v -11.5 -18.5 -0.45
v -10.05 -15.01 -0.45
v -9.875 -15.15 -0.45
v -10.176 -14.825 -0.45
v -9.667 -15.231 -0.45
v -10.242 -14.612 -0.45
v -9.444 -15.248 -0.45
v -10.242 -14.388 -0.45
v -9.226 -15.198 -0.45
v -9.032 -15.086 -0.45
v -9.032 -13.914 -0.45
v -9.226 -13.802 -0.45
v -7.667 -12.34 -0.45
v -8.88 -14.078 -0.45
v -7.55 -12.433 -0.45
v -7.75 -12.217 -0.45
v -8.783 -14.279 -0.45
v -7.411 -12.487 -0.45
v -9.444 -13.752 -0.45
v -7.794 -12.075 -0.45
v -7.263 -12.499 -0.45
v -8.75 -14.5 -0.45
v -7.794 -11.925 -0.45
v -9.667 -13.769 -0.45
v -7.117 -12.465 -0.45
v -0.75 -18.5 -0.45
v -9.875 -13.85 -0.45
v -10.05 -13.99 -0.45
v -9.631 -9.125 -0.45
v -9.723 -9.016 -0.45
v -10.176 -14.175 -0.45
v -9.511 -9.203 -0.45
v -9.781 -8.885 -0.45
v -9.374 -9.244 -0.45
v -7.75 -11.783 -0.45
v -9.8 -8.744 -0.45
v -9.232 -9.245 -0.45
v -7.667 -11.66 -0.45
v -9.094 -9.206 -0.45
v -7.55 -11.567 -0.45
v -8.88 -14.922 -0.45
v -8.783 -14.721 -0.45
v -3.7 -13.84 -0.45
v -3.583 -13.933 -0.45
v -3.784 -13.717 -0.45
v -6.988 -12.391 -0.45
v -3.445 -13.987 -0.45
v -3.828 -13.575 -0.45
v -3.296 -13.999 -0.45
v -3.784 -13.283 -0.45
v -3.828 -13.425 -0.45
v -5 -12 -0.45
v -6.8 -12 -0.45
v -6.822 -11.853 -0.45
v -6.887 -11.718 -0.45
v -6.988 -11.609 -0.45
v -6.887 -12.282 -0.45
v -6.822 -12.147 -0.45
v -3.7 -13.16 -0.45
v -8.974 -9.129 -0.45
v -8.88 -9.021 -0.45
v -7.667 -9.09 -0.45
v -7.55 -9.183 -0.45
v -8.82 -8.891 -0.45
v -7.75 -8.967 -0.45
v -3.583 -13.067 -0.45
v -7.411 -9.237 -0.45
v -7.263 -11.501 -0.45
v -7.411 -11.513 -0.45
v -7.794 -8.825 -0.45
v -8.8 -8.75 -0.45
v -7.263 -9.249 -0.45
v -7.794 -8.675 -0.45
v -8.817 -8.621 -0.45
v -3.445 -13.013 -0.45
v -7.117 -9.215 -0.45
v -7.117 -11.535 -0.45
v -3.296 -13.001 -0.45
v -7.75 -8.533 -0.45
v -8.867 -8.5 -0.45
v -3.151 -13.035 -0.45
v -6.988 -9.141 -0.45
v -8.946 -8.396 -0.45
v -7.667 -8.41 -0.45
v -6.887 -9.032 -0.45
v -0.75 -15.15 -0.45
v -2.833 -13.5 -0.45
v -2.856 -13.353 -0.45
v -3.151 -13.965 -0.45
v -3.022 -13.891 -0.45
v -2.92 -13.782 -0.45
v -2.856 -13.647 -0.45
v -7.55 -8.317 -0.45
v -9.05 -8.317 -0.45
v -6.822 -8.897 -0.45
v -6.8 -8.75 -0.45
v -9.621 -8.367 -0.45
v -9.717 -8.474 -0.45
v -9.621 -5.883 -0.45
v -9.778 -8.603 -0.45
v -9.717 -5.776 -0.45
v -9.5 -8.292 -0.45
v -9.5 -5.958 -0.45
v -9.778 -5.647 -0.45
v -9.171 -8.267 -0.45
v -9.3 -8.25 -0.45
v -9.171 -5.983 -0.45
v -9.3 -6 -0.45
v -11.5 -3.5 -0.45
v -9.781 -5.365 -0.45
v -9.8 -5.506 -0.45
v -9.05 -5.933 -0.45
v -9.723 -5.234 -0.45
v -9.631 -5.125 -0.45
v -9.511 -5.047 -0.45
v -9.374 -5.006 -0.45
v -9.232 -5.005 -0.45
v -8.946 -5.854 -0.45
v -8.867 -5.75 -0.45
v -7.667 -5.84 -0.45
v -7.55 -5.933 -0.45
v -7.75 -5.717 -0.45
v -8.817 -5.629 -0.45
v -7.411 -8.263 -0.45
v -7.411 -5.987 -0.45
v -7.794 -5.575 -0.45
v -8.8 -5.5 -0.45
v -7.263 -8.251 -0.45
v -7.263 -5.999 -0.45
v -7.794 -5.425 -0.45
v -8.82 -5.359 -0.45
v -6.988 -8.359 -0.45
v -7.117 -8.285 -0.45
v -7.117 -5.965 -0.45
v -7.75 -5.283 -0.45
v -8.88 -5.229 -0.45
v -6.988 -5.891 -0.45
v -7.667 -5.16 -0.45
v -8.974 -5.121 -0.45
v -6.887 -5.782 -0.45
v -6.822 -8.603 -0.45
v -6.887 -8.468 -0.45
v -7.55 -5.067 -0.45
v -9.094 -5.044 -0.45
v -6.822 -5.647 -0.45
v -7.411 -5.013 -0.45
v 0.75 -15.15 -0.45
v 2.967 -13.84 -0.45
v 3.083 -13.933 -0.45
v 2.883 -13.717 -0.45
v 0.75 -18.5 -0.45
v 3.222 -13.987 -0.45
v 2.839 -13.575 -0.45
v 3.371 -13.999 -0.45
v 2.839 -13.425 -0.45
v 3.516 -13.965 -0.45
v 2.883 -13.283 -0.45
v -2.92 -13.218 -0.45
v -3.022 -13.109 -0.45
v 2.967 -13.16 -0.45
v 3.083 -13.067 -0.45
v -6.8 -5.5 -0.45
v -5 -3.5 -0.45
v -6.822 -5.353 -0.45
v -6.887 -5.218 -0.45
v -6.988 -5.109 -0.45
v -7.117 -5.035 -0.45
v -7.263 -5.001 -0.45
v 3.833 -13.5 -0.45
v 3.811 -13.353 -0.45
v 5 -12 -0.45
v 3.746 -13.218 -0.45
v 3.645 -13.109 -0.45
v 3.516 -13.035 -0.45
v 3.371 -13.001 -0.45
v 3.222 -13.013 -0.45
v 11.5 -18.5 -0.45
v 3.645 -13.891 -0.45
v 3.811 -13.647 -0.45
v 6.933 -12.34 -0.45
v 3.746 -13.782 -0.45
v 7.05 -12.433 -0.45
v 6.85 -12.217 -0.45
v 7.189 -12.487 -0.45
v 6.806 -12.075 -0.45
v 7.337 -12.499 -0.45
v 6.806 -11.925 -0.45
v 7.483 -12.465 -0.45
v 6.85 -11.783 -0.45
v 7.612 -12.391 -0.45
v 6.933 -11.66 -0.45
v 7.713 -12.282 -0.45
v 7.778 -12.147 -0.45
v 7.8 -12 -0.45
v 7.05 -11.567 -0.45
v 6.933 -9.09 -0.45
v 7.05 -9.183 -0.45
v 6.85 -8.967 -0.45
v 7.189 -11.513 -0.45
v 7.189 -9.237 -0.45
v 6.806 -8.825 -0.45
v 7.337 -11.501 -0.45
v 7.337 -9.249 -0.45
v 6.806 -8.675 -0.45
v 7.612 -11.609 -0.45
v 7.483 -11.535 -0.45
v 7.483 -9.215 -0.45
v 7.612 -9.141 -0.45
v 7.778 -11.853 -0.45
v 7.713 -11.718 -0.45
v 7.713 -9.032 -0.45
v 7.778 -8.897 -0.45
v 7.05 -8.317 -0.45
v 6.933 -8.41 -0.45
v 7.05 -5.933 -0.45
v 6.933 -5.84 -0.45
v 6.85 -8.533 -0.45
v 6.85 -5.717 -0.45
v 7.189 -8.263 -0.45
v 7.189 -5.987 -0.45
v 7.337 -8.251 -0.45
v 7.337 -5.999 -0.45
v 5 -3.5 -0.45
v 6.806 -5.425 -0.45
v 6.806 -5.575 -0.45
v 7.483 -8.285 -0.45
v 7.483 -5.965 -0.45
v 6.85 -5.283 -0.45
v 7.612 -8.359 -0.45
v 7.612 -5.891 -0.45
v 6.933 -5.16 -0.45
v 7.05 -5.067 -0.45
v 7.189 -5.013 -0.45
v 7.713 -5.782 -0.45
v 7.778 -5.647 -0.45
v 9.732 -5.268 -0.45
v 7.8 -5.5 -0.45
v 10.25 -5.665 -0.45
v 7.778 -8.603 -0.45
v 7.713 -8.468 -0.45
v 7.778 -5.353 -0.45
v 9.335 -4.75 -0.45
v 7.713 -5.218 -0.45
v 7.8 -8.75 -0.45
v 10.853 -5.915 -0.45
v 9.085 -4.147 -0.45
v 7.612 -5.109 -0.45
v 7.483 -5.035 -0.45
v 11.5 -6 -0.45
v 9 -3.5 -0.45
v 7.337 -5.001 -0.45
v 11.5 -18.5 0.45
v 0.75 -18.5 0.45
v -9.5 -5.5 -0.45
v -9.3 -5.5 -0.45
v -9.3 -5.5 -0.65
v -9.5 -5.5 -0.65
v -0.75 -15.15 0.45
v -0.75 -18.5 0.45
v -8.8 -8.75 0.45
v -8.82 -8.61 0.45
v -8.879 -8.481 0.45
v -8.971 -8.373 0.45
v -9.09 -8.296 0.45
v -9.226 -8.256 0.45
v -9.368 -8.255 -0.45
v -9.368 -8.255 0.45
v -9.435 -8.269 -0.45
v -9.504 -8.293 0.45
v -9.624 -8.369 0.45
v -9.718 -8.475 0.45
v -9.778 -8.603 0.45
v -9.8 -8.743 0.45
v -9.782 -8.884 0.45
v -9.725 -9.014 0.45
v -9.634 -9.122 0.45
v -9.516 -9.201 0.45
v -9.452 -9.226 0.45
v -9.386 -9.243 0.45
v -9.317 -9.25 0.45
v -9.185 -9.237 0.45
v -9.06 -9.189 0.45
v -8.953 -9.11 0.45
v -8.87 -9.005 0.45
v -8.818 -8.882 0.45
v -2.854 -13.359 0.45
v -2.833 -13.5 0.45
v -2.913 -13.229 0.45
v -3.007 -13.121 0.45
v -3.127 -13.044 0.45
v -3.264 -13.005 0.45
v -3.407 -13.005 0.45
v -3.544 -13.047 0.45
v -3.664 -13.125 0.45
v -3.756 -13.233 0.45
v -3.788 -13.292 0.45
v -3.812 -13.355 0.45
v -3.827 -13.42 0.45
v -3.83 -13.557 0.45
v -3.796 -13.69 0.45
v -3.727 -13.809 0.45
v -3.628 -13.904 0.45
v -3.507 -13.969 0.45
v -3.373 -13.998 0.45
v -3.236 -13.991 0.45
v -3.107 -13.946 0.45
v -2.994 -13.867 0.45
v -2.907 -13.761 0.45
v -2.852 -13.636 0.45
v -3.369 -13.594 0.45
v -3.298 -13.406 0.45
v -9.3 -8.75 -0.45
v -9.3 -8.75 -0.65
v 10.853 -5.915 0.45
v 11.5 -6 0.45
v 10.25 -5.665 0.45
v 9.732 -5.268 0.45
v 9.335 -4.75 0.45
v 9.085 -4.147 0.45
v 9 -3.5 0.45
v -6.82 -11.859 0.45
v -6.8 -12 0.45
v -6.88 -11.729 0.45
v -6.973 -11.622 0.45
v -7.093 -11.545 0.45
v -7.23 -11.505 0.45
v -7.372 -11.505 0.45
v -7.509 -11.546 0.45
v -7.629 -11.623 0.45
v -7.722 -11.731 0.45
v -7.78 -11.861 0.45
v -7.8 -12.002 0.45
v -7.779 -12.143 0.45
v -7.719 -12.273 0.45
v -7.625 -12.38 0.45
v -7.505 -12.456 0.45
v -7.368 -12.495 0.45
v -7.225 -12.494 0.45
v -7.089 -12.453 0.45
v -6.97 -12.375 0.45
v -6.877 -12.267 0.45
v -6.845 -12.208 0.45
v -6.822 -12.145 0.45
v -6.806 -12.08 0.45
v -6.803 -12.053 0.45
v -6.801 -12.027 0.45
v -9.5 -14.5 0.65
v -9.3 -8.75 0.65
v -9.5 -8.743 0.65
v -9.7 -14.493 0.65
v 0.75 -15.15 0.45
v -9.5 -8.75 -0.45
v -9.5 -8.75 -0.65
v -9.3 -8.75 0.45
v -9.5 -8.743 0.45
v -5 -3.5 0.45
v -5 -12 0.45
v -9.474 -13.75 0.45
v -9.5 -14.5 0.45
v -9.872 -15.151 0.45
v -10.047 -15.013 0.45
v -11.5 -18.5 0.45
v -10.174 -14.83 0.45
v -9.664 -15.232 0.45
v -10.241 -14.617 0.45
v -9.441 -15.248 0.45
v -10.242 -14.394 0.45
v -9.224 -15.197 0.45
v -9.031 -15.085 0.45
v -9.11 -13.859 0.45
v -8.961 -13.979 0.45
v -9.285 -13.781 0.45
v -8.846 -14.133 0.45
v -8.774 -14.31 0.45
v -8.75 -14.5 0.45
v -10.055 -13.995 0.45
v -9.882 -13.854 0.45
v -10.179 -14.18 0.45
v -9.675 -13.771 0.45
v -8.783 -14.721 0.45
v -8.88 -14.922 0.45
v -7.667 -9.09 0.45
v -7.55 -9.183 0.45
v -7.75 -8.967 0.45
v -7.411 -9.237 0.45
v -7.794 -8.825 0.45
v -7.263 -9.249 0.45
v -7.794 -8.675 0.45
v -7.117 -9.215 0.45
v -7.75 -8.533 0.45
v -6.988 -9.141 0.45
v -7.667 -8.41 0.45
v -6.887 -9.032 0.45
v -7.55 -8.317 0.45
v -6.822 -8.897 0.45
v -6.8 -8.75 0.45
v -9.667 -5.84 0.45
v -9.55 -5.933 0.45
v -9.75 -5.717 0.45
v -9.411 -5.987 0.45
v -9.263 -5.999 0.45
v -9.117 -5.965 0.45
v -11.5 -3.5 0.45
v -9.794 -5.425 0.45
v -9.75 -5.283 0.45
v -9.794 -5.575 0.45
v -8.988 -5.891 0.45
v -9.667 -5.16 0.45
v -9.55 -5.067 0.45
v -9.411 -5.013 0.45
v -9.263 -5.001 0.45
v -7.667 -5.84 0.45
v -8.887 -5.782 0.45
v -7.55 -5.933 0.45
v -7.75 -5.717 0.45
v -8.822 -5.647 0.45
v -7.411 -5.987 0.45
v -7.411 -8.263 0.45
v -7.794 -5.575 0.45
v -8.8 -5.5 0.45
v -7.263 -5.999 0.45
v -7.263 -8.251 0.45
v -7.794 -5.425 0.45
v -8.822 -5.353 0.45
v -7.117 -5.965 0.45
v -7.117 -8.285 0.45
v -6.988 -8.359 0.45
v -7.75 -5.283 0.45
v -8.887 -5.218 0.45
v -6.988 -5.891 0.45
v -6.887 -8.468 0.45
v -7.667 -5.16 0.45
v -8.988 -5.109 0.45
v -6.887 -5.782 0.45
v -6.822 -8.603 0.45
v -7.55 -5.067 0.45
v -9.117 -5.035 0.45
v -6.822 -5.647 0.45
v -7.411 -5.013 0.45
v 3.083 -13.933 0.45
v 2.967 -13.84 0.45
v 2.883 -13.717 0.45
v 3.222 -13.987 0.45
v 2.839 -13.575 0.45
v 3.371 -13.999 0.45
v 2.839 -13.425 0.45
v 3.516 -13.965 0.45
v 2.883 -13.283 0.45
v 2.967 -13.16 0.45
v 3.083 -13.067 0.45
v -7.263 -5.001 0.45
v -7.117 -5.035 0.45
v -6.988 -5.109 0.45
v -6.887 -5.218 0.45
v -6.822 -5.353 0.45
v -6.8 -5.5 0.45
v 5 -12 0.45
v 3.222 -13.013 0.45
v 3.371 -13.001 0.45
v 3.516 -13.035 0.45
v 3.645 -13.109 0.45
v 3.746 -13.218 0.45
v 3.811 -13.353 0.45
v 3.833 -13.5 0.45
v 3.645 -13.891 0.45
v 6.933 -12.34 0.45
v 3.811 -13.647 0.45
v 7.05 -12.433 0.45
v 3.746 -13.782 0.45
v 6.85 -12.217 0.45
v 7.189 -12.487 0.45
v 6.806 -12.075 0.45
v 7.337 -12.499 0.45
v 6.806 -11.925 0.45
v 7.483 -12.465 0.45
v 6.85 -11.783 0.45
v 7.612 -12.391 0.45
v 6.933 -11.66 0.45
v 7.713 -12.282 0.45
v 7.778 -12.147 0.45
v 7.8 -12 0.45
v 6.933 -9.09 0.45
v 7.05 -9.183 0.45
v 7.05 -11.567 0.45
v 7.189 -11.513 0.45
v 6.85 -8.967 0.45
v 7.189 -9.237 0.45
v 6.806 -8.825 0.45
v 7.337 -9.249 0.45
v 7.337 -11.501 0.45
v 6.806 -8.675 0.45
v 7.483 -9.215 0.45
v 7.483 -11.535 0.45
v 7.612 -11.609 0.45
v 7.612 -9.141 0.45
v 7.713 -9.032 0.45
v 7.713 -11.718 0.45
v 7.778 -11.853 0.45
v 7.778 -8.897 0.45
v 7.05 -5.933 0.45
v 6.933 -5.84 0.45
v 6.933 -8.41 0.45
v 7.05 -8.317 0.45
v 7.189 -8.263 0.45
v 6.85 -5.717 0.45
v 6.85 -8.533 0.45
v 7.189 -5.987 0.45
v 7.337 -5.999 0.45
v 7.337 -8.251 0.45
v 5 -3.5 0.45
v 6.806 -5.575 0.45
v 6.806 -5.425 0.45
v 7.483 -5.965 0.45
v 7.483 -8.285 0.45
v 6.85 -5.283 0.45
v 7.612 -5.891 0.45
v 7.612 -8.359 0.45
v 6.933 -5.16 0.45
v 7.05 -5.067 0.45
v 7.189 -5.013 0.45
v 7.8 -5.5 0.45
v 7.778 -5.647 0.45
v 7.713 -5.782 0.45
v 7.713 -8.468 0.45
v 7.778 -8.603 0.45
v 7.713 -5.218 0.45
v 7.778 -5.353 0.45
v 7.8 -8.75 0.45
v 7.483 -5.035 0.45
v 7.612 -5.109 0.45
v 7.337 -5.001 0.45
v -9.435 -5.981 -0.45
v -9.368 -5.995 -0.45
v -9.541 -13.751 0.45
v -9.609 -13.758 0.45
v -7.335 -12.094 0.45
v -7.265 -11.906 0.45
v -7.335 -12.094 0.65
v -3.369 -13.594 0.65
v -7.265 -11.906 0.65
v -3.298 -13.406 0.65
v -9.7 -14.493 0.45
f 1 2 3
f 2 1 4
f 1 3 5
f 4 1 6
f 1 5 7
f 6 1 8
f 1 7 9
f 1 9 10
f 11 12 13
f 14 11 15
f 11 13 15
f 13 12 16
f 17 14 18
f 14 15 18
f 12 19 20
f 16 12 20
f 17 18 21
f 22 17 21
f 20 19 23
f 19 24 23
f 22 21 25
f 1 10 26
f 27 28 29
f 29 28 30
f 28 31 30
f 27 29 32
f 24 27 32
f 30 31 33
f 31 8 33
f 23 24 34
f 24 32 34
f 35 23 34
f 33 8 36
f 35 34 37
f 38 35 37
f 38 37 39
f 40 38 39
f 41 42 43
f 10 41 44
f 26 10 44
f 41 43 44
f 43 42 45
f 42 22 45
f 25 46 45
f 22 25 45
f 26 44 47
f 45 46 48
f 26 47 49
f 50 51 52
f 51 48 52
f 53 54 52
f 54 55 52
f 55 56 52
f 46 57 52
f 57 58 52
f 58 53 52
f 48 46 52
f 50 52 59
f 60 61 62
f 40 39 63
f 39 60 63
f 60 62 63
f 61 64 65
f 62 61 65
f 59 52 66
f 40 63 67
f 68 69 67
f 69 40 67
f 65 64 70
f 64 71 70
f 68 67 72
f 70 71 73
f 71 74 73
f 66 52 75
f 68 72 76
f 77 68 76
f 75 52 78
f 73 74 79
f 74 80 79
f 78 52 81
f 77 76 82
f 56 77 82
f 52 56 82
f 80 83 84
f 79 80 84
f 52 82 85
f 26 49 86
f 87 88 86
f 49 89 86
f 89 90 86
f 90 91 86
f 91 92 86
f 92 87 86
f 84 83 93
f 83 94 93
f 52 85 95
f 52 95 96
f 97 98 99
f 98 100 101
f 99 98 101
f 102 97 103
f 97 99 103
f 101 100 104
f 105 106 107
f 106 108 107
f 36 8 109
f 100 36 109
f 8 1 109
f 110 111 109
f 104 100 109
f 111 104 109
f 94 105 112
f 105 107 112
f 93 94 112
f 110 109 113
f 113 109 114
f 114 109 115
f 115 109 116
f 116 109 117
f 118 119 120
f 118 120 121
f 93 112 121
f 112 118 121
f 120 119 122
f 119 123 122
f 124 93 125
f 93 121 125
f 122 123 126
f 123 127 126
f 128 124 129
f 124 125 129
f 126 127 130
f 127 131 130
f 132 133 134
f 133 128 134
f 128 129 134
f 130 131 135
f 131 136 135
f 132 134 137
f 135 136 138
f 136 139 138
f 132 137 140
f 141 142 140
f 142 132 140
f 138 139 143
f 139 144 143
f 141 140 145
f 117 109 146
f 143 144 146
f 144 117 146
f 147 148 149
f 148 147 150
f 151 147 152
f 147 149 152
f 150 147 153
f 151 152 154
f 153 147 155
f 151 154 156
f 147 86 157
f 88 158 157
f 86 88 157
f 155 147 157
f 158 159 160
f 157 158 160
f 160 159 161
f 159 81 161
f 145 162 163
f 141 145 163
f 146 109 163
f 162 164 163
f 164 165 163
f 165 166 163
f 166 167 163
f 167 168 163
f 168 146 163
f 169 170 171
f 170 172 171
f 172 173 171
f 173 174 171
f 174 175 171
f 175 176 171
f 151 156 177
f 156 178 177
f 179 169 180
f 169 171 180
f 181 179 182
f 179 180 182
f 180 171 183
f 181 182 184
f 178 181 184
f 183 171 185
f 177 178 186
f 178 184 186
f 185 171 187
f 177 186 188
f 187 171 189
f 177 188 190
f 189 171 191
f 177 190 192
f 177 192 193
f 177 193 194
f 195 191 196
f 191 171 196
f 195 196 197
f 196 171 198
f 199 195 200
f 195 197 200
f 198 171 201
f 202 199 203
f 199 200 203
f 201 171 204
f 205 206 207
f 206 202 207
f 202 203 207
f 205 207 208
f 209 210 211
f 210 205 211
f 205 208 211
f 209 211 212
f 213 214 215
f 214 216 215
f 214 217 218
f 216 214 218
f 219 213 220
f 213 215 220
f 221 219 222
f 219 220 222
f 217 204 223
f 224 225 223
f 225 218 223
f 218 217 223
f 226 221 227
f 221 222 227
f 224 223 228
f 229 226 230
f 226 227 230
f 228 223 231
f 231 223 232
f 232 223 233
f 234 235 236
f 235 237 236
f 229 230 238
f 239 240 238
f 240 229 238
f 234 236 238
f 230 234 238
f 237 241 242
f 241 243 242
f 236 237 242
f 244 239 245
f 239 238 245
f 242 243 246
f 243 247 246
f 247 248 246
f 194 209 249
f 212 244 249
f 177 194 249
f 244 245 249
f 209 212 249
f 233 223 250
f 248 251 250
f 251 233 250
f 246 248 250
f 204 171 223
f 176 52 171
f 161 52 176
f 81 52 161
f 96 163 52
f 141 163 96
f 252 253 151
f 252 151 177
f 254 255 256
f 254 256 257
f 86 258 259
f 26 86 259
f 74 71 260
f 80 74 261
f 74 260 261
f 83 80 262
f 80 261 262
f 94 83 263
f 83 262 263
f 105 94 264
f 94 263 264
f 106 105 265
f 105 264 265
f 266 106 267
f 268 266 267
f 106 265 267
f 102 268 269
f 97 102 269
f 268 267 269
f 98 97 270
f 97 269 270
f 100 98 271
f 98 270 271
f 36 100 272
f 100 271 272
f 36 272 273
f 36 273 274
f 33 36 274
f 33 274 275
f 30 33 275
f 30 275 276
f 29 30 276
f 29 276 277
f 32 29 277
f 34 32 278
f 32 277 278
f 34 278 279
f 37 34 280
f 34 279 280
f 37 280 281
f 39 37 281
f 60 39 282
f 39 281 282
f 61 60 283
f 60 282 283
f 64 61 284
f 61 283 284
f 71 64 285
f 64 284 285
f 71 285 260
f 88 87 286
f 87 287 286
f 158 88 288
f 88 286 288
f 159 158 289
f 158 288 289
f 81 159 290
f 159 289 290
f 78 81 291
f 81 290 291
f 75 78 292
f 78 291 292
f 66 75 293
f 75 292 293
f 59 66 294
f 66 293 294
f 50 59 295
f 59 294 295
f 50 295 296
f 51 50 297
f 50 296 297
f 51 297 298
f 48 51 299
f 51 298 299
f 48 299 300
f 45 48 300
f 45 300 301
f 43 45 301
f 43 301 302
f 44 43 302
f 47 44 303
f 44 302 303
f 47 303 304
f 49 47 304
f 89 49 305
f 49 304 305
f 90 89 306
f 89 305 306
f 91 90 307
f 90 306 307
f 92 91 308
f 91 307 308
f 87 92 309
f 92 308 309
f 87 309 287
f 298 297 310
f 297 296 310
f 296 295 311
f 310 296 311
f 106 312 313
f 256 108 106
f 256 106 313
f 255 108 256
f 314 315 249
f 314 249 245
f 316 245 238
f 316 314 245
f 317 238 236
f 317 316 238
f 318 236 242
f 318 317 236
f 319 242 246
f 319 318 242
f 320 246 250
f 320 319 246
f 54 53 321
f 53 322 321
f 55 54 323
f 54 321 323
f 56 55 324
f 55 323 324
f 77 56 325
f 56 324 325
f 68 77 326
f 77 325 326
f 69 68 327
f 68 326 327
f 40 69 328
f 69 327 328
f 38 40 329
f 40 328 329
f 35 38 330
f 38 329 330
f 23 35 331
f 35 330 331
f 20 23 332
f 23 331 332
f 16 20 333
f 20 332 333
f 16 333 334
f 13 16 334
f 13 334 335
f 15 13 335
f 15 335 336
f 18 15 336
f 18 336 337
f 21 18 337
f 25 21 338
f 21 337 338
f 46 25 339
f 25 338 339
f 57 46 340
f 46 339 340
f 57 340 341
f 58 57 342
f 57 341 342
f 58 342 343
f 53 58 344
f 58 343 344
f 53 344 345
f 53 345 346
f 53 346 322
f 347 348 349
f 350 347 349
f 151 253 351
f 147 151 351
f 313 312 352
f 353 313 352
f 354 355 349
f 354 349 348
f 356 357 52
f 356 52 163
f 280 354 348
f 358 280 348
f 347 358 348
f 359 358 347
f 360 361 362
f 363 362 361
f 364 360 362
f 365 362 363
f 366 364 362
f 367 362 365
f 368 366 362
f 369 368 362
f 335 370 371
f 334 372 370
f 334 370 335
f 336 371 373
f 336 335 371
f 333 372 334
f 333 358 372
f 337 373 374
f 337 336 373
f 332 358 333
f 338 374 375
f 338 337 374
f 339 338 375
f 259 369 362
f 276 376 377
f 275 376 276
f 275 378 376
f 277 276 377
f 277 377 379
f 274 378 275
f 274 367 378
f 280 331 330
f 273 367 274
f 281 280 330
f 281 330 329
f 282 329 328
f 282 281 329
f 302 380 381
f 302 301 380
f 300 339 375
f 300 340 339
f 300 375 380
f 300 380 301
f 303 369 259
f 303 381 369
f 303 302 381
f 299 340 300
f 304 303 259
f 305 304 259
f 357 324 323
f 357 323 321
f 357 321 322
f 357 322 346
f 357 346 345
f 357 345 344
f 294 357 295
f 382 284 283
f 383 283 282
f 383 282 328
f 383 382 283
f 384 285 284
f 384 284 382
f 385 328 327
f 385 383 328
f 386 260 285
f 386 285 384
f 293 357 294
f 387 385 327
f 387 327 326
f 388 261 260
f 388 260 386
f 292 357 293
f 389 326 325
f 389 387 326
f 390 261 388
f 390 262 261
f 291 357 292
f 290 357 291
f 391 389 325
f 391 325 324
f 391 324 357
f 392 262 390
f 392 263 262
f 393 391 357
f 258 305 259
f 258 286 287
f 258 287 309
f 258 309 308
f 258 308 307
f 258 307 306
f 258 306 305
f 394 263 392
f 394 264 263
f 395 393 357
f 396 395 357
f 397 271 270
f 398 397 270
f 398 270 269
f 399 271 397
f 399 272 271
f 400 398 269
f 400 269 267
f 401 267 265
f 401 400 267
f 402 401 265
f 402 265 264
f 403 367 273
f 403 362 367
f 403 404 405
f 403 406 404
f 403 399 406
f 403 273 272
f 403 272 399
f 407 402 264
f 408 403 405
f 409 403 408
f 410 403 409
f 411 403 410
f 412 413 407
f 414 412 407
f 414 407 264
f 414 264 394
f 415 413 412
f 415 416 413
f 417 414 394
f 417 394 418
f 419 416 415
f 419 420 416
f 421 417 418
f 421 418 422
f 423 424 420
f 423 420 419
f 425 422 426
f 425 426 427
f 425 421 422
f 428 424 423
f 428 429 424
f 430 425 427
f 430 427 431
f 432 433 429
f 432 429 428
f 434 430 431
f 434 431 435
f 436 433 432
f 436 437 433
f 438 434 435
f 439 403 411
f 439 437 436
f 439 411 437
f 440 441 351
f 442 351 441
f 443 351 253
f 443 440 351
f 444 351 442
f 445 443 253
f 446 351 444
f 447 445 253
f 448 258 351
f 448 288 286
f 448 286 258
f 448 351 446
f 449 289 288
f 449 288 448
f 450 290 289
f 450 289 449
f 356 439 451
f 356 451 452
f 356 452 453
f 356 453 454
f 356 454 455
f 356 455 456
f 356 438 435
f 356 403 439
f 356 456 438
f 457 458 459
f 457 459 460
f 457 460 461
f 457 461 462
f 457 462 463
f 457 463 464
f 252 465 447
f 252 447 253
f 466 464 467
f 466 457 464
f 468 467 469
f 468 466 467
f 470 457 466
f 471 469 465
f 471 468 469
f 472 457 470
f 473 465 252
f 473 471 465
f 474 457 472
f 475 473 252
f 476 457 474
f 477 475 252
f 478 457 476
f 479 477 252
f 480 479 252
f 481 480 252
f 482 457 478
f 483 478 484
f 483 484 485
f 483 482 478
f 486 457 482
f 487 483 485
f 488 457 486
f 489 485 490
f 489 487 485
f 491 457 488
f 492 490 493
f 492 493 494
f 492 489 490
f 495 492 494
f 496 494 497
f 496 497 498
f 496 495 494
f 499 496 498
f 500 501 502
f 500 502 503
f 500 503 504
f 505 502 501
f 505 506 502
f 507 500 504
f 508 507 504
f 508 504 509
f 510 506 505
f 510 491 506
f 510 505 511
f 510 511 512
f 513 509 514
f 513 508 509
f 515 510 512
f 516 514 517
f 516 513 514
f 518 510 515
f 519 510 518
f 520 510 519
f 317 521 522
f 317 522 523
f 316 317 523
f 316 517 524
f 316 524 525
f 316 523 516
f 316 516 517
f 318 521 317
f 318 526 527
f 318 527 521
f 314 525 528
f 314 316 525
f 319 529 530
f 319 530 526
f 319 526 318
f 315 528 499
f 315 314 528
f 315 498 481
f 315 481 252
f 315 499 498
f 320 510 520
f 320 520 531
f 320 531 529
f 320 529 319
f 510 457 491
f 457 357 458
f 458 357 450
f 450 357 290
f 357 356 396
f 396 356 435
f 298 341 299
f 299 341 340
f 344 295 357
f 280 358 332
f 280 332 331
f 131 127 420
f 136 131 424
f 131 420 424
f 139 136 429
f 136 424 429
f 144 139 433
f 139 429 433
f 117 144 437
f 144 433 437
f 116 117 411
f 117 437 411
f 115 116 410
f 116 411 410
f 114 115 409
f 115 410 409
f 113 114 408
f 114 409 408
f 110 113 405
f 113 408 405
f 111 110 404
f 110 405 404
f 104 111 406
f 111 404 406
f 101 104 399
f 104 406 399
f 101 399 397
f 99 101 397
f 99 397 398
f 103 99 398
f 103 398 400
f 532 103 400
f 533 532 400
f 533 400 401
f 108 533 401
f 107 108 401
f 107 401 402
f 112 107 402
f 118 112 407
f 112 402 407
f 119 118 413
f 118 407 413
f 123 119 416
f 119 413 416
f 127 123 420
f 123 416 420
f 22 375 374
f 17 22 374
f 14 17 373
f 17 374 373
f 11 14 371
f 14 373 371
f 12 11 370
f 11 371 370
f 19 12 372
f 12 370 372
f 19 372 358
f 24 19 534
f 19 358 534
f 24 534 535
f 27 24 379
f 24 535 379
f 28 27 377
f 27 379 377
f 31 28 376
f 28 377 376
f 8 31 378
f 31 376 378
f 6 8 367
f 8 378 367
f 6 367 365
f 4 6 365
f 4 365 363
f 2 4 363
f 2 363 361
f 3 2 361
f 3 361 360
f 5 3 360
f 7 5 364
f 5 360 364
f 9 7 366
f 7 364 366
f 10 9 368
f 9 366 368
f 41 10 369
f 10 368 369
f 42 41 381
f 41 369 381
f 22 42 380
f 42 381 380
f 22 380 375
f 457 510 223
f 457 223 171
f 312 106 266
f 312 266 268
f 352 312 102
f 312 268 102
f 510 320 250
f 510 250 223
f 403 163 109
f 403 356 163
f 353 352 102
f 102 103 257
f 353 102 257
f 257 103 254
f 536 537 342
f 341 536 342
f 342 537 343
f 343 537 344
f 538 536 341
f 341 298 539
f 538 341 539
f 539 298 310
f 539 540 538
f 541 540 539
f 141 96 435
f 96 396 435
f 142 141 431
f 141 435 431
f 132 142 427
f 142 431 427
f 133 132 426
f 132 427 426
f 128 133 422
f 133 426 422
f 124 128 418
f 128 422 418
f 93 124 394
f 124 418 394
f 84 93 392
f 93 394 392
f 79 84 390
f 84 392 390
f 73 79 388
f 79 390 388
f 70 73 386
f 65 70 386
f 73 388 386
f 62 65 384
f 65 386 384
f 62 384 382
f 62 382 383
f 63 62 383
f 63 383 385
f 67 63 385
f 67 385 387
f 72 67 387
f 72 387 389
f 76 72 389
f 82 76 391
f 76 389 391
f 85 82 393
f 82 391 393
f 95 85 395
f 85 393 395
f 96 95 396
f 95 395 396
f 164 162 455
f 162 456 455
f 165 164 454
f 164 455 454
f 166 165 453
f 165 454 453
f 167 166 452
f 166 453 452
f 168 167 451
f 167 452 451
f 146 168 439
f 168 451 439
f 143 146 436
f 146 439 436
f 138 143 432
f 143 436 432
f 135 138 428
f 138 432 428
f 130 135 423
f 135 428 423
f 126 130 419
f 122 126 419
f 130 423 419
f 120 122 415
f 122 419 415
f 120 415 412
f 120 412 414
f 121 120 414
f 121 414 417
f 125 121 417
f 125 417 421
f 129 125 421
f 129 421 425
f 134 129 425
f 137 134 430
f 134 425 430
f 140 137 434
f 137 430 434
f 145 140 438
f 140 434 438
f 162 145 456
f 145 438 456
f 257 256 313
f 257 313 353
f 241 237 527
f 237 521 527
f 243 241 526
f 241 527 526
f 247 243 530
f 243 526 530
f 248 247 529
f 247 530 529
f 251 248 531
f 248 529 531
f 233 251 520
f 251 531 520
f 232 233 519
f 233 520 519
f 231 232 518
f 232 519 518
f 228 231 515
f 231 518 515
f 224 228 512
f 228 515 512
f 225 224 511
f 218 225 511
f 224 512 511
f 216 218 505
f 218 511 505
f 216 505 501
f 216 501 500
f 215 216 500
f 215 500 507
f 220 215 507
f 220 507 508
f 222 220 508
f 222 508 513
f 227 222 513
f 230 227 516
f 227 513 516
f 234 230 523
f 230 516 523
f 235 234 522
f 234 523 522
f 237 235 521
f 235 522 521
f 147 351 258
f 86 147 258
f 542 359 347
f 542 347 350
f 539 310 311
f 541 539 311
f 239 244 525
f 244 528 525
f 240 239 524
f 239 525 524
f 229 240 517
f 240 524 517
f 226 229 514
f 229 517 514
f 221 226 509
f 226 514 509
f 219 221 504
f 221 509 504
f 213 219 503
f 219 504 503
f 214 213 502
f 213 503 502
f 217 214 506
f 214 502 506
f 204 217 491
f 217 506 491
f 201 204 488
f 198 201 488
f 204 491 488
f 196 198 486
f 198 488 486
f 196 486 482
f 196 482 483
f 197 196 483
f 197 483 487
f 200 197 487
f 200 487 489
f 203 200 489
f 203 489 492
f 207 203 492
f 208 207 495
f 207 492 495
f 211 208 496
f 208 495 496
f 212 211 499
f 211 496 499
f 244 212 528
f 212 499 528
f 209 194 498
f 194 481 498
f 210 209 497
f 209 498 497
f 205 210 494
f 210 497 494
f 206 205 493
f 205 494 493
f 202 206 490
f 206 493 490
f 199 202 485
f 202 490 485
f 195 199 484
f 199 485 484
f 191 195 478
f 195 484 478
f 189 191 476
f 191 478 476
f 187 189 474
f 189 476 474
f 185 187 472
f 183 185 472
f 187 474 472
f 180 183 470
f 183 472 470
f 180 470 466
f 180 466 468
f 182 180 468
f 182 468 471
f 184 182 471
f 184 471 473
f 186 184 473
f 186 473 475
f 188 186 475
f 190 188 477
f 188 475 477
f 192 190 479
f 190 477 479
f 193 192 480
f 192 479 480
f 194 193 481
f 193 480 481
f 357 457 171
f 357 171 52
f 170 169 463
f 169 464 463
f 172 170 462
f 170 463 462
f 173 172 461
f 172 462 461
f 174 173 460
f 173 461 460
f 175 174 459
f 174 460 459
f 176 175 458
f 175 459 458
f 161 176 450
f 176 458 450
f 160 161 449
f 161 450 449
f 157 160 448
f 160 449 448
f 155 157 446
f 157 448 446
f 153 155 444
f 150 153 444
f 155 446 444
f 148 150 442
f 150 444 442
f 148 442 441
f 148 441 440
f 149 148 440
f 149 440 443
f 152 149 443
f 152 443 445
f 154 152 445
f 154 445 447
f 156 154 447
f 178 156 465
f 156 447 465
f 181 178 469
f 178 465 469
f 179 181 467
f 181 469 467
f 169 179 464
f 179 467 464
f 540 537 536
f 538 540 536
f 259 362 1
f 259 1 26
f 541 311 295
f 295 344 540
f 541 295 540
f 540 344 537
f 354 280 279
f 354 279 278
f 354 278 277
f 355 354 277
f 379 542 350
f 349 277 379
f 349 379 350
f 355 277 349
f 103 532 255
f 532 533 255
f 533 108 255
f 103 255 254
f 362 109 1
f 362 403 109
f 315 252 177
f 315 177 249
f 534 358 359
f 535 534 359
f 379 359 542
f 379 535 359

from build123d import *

# Parameters (mm, degrees)
EXTRUDE_1_DEPTH     = 0.45
CUT_EXTRUDE_1_DEPTH = 5
SKETCH_6_R          = 0.5
SKETCH_6_R_2        = 0.75
CUT_EXTRUDE_4_DEPTH = 10.1
EXTRUDE_1_2_DEPTH   = 0.2
SKETCH_8_W          = 0.2
SKETCH_8_H          = 3.25
EXTRUDE_2_DEPTH     = 0.2
EXTRUDE_3_DEPTH     = 0.2


with BuildPart() as part:
    # Эскиз1 → Extrude 1 (new, symmetric)
    with BuildSketch(Plane.XY):
        with BuildLine():
            Line((-11.5, -18.5), (11.5, -18.5))
            Line((11.5, -18.5), (11.5, -6))
            ThreePointArc((11.5, -6), (9.732233047, -5.267766953), (9, -3.5))
            Line((9, -3.5), (5, -3.5))
            Line((5, -3.5), (5, -12))
            Line((5, -12), (-5, -12))
            Line((-5, -12), (-5, -3.5))
            Line((-5, -3.5), (-9, -3.5))
            Line((-9, -3.5), (-11.5, -3.5))
            Line((-11.5, -3.5), (-11.5, -6))
            Line((-11.5, -6), (-11.5, -18.5))
        make_face()
    extrude(amount=EXTRUDE_1_DEPTH, both=True)

    # Эскиз2 → Вырез-Вытянуть1 (cut, symmetric)
    with BuildSketch(Plane.XY):
        Polygon((-0.75, -15.25), (-0.75, -18.5), (0.75, -18.5), (0.75, -15.25), (0.75, -15.15), (-0.75, -15.15), align=None)
    extrude(amount=CUT_EXTRUDE_1_DEPTH, both=True, mode=Mode.SUBTRACT)

    # Эскиз6 → Вырез-Вытянуть4 (cut, symmetric)
    with BuildSketch(Plane.XY):
        with Locations((3.333333333, -13.5)):
            Circle(SKETCH_6_R)
        with Locations((-7.3, -8.75)):
            Circle(SKETCH_6_R)
        with Locations((-7.3, -5.5)):
            Circle(SKETCH_6_R)
        with Locations((7.3, -8.75)):
            Circle(SKETCH_6_R)
        with Locations((7.3, -5.5)):
            Circle(SKETCH_6_R)
        with Locations((-3.333333333, -13.5)):
            Circle(SKETCH_6_R)
        with Locations((-7.3, -12)):
            Circle(SKETCH_6_R)
        with Locations((7.3, -12)):
            Circle(SKETCH_6_R)
        with Locations((-9.5, -14.5)):
            Circle(SKETCH_6_R_2)
        with Locations((-9.3, -8.75)):
            Circle(SKETCH_6_R)
        with Locations((-9.3, -5.5)):
            Circle(SKETCH_6_R)
    extrude(amount=CUT_EXTRUDE_4_DEPTH, both=True, mode=Mode.SUBTRACT)

    # Эскиз7 → Extrude 1 2 (add)
    with BuildSketch(Plane.XY.offset(0.45)):
        Polygon((-7.335370626, -12.093535655), (-3.368703959, -13.593535655), (-3.297962707, -13.406464345), (-7.264629374, -11.906464345), align=None)
    extrude(amount=EXTRUDE_1_2_DEPTH)

    # Эскиз8 → Вытянуть-Тонкостенный2 (add)
    with BuildSketch(Plane(origin=(0, 0, -0.45), x_dir=(-1, 0, 0), z_dir=(0, 0, -1))):
        with Locations((9.4, -7.125)):
            Rectangle(SKETCH_8_W, SKETCH_8_H)
    extrude(amount=EXTRUDE_2_DEPTH)

    # Эскиз9 → Вытянуть-Тонкостенный3 (add)
    with BuildSketch(Plane.XY.offset(0.45)):
        Polygon((-9.3, -8.75), (-9.5, -14.5), (-9.699879127, -14.493047683), (-9.499879127, -8.743047683), align=None)
    extrude(amount=EXTRUDE_3_DEPTH)


solid = part.part
